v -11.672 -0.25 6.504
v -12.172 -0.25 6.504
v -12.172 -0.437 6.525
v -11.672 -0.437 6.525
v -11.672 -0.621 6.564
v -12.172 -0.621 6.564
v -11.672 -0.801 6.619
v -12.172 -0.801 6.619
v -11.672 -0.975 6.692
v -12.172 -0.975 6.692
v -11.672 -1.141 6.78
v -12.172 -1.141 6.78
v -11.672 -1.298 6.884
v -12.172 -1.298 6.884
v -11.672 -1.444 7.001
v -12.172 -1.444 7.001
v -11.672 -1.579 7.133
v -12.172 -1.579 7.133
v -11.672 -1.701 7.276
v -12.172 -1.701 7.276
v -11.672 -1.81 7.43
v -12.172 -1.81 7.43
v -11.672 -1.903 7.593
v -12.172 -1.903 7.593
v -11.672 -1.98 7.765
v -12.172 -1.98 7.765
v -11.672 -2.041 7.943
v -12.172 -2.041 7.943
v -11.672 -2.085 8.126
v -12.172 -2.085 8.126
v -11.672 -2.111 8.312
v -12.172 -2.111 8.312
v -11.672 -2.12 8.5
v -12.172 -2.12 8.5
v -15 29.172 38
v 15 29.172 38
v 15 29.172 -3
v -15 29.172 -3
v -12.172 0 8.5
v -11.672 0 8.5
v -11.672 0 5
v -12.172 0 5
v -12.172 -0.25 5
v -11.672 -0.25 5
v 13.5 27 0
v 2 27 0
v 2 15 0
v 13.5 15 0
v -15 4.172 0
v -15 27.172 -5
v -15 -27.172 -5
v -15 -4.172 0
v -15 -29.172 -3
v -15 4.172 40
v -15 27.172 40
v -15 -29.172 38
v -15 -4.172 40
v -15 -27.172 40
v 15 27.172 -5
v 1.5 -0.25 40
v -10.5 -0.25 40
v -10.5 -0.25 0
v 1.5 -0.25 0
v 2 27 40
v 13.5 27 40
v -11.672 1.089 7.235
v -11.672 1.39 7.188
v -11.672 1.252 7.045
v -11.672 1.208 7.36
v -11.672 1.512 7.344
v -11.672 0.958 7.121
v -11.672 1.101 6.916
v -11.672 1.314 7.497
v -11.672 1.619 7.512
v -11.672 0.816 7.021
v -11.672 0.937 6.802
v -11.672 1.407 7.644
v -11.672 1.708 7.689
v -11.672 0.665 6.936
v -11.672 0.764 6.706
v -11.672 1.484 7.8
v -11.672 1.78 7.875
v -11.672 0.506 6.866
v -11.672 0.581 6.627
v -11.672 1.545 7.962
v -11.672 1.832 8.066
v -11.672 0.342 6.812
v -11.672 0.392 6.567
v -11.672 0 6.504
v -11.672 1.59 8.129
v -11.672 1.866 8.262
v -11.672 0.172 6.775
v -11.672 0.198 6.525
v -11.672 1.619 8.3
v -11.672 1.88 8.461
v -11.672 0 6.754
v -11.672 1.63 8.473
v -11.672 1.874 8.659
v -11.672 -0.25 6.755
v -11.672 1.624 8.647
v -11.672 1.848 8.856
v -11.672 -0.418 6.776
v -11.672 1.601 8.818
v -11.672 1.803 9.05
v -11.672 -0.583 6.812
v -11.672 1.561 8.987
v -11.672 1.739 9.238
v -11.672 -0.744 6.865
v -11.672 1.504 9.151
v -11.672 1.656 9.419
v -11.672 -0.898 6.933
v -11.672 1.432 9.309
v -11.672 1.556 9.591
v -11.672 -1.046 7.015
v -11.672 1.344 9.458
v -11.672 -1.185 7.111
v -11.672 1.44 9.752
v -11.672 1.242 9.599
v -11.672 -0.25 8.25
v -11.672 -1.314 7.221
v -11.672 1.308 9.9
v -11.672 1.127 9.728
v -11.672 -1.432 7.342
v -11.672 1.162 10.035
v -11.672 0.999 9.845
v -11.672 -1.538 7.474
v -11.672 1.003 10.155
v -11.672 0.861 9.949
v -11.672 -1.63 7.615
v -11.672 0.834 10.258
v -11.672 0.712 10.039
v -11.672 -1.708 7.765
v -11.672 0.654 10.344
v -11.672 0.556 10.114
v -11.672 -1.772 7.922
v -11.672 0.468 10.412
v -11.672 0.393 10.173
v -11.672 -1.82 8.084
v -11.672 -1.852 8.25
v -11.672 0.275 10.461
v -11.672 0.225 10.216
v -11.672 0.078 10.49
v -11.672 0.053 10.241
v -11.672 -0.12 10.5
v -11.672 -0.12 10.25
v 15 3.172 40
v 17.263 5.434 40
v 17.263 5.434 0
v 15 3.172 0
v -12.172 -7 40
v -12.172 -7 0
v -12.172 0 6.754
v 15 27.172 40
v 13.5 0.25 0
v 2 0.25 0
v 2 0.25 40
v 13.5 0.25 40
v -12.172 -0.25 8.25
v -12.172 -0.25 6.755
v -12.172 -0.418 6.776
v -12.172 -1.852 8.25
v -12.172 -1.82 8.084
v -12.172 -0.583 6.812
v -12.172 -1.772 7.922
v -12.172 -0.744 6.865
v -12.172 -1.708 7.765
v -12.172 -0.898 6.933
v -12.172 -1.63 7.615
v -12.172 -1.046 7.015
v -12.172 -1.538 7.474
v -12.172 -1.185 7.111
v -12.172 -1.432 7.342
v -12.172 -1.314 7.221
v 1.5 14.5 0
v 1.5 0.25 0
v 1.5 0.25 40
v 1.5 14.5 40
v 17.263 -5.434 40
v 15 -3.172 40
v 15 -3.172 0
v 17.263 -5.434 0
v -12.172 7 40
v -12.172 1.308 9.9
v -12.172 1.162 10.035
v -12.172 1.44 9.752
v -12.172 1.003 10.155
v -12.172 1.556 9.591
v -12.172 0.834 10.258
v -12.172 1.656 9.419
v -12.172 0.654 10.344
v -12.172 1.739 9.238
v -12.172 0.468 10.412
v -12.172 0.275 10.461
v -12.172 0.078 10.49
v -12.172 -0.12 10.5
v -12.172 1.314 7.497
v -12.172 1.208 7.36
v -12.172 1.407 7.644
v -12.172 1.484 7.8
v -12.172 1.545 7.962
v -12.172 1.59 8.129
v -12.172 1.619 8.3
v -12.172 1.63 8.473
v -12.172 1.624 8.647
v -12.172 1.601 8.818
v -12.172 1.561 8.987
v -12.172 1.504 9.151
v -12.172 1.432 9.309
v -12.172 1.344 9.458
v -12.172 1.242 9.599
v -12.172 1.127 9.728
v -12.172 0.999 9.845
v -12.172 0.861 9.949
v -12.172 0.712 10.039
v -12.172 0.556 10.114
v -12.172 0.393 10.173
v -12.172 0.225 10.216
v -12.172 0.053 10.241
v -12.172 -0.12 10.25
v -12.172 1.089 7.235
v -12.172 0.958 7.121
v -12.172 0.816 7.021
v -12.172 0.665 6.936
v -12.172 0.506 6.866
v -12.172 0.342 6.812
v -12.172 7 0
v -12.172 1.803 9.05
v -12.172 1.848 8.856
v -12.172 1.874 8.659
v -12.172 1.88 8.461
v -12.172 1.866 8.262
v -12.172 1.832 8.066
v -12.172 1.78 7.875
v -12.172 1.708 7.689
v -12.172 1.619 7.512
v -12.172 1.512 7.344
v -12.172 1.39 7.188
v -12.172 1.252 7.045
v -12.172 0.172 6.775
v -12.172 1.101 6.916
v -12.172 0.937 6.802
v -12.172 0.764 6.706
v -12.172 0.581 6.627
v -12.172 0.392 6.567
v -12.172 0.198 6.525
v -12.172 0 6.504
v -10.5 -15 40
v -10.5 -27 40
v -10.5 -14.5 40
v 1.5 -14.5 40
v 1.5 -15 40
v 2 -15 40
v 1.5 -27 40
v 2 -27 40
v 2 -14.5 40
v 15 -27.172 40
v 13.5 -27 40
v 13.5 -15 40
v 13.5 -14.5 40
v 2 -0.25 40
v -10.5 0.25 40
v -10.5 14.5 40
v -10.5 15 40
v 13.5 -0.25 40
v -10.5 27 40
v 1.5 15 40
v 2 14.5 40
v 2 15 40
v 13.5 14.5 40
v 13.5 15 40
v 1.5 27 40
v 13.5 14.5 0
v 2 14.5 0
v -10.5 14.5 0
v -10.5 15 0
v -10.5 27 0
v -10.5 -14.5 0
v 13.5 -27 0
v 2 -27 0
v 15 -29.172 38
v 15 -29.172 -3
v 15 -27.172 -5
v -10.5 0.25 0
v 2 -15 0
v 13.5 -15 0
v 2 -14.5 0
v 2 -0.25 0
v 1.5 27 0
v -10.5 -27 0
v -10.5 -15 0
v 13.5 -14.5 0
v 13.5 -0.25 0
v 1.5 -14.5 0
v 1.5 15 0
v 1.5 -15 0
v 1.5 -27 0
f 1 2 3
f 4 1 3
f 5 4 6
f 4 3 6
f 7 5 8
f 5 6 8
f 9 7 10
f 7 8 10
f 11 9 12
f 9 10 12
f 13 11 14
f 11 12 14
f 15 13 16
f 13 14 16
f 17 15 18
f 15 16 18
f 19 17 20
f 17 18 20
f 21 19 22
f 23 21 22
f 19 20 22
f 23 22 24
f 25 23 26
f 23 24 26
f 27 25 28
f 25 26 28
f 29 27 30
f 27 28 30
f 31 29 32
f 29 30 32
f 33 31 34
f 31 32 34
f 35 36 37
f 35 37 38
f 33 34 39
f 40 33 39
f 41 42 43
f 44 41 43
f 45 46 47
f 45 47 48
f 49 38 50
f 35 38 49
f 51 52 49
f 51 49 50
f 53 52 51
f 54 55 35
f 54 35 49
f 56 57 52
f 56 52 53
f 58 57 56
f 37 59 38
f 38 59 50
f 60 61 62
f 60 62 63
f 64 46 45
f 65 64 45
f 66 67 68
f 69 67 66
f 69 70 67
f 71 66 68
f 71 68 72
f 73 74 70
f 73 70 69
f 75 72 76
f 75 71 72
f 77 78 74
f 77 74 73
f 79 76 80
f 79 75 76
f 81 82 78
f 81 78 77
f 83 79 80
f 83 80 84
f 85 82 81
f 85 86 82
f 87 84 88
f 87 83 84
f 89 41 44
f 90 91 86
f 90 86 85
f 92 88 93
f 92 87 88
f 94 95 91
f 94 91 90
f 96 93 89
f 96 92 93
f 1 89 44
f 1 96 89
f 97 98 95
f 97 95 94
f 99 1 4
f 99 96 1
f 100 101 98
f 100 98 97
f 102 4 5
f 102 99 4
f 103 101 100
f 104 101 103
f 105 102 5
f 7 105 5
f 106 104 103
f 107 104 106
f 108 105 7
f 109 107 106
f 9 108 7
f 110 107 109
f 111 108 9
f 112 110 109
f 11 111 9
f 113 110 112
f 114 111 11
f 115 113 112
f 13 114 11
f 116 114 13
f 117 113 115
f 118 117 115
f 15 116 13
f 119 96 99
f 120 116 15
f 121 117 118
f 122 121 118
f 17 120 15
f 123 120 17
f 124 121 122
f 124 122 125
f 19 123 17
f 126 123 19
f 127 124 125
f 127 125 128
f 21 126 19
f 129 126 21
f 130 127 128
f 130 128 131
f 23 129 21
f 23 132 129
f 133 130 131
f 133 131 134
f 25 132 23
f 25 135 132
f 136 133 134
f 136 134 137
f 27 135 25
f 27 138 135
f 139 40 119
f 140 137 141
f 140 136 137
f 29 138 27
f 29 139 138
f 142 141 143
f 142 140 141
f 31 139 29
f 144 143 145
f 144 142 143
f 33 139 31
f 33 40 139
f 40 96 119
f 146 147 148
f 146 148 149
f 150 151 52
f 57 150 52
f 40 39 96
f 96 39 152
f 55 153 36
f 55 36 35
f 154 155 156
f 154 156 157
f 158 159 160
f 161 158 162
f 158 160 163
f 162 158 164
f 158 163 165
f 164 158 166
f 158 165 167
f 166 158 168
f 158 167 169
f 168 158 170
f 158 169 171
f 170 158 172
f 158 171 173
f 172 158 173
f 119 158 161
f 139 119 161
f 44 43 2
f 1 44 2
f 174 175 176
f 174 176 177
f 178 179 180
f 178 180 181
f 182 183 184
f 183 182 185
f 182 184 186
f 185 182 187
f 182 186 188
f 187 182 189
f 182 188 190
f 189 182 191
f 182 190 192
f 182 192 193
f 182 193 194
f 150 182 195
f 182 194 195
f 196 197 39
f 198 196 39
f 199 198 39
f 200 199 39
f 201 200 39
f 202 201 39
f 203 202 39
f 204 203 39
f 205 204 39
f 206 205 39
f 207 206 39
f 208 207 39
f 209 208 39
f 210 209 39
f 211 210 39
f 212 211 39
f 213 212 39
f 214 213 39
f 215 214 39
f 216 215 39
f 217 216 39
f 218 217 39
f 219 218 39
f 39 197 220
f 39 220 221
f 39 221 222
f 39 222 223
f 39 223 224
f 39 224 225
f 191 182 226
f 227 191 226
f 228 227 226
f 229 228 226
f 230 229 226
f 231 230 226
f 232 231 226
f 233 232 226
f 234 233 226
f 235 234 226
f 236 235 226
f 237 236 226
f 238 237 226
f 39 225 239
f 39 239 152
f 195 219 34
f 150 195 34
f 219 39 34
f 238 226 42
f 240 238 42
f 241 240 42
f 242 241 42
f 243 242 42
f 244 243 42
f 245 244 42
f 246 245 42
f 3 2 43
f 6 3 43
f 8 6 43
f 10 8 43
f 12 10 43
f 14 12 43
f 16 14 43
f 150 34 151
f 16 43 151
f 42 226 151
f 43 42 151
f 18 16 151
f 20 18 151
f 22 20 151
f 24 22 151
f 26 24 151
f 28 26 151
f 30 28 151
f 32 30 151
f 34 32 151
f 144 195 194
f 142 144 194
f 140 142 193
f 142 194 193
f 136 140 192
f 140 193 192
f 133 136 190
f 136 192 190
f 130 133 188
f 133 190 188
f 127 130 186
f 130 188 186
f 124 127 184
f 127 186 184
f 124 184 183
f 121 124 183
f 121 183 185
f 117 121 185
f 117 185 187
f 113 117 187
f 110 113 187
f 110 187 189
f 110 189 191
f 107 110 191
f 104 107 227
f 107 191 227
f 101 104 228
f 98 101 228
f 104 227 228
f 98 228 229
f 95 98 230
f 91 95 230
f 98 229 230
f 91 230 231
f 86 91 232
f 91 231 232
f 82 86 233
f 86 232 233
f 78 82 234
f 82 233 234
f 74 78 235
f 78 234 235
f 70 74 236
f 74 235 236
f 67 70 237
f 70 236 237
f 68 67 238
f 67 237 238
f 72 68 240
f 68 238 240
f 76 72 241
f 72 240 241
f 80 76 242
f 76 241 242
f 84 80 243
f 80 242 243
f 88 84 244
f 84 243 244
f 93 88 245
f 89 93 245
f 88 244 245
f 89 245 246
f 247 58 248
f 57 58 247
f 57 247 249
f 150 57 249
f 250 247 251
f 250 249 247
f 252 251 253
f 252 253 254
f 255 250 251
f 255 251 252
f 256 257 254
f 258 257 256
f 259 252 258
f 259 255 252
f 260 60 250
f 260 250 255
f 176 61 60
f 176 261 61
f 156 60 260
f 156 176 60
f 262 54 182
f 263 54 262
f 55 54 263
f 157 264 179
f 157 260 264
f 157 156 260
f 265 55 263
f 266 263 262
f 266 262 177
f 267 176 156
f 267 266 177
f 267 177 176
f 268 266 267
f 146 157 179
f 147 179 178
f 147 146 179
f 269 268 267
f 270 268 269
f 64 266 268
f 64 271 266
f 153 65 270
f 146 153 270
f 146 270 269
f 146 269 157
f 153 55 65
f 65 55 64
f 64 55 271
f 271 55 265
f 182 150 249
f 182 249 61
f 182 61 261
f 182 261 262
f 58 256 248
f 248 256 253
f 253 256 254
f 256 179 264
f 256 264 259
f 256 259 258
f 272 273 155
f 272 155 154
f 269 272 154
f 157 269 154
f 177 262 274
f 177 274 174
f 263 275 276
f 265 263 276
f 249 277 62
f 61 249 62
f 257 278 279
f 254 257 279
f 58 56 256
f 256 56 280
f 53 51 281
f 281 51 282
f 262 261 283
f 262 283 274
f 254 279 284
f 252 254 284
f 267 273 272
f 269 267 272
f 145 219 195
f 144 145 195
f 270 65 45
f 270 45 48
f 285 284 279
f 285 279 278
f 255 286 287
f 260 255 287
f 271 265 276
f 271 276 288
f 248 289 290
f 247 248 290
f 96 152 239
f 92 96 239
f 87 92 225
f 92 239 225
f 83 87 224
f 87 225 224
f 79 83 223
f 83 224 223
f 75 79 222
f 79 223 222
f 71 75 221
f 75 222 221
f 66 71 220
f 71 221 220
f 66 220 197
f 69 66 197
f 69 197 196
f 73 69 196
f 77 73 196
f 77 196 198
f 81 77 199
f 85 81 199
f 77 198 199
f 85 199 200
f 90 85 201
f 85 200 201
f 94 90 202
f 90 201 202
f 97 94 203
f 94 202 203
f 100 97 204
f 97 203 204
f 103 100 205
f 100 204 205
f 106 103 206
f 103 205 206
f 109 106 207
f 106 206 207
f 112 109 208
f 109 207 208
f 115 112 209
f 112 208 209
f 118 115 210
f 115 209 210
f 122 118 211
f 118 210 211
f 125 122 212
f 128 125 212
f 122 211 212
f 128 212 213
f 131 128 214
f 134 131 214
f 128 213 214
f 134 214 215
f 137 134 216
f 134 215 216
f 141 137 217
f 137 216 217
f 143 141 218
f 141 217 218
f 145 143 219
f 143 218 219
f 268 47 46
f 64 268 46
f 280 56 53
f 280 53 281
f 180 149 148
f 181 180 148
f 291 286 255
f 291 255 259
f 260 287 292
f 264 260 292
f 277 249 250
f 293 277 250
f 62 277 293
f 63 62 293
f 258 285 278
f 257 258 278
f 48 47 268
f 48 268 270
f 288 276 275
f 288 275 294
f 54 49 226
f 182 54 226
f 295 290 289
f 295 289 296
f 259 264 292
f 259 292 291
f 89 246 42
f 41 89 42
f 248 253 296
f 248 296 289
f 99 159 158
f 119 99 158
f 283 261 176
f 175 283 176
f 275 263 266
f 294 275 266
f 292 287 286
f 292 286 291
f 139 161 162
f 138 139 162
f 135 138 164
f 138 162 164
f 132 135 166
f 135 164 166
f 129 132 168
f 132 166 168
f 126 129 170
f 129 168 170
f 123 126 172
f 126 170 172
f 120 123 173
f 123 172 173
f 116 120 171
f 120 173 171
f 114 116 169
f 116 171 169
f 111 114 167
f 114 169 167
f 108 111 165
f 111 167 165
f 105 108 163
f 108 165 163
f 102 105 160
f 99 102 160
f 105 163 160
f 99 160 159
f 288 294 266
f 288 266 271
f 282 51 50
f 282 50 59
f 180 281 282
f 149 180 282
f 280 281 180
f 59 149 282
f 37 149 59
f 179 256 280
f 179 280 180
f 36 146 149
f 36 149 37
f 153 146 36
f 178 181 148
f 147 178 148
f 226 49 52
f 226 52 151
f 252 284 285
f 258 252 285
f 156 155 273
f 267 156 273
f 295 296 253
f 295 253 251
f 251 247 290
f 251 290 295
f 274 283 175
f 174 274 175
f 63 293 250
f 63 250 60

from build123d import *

# Parameters (mm, degrees)
F0_W     = 0.5
F0_H     = 14.25
F0_H_2   = 12
F0_W_2   = 11.5
F0_H_3   = 0.5
F0_W_3   = 12
F1_DEPTH = 40
F2_DEPTH = 5
F3_SIZE  = 2
F5_DEPTH = 0.5


with BuildPart() as f1:
    # F0 (on Top) → F1 (new body)
    with BuildSketch(Plane.XY):
        Polygon((17.2627416998, 5.4343145751), (15, 3.1715728753), (15, -3.1715728753), (17.2627416998, -5.4343145751), (17.2627416998, -0.5656854249), (17.2627416998, 0.5656854249), align=None)
        Polygon((-15, 29.1715728753), (-15, 4.1715728753), (-12.1715728752, 7), (-12.1715728752, 0), (-12.1715728752, -7), (-15, -4.1715728753), (-15, -29.1715728753), (15, -29.1715728753), (15, -3.1715728753), (15, 3.1715728753), (15, 29.1715728753), align=None)
        Polygon((-10.4999961331, 14.999999851), (-10.4999961331, 26.999999851), (1.5000038669, 26.999999851), (2.0000038669, 26.999999851), (13.5000038669, 26.999999851), (13.5000038669, 14.999999851), (13.5000038669, 14.499999851), (13.5000038669, 0.249999851), (13.5000038669, -0.250000149), (13.5000038669, -14.500000149), (13.5000038669, -15.000000149), (13.5000038669, -27.000000149), (2.0000038669, -27.000000149), (1.5000038669, -27.000000149), (-10.4999961331, -27.000000149), (-10.4999961331, -15.000000149), (-10.4999961331, -14.500000149), (-10.4999961331, -0.250000149), (-10.4999961331, 0.249999851), (-10.4999961331, 14.499999851), align=None, mode=Mode.SUBTRACT)
        with Locations((1.7500038669, -7.375000149)):
            Rectangle(F0_W, F0_H)
        with Locations((1.7500038669, 20.999999851)):
            Rectangle(F0_W, F0_H_2)
        with Locations((7.7500038669, 14.749999851)):
            Rectangle(F0_W_2, F0_H_3)
        with Locations((-4.4999961331, -1.49e-07)):
            Rectangle(F0_W_3, F0_H_3)
        with Locations((7.7500038669, -1.49e-07)):
            Rectangle(F0_W_2, F0_H_3)
        with Locations((7.7500038669, -14.750000149)):
            Rectangle(F0_W_2, F0_H_3)
        with Locations((-4.4999961331, -14.750000149)):
            Rectangle(F0_W_3, F0_H_3)
        with Locations((-4.4999961331, 14.749999851)):
            Rectangle(F0_W_3, F0_H_3)
        with Locations((1.7500038669, 7.374999851)):
            Rectangle(F0_W, F0_H)
        with Locations((1.7500038669, -21.000000149)):
            Rectangle(F0_W, F0_H_2)
        with Locations((1.7500038669, -14.750000149)):
            Rectangle(F0_W, F0_H_3)
        with Locations((1.7500038669, -1.49e-07)):
            Rectangle(F0_W, F0_H_3)
        with Locations((1.7500038669, 14.749999851)):
            Rectangle(F0_W, F0_H_3)
    extrude(amount=F1_DEPTH)

    # F0 (on Top) → F2 (join)
    with BuildSketch(Plane.XY):
        Polygon((-15, 29.1715728753), (-15, 4.1715728753), (-12.1715728752, 7), (-12.1715728752, 0), (-12.1715728752, -7), (-15, -4.1715728753), (-15, -29.1715728753), (15, -29.1715728753), (15, -3.1715728753), (15, 3.1715728753), (15, 29.1715728753), align=None)
        Polygon((-10.4999961331, 14.999999851), (-10.4999961331, 26.999999851), (1.5000038669, 26.999999851), (2.0000038669, 26.999999851), (13.5000038669, 26.999999851), (13.5000038669, 14.999999851), (13.5000038669, 14.499999851), (13.5000038669, 0.249999851), (13.5000038669, -0.250000149), (13.5000038669, -14.500000149), (13.5000038669, -15.000000149), (13.5000038669, -27.000000149), (2.0000038669, -27.000000149), (1.5000038669, -27.000000149), (-10.4999961331, -27.000000149), (-10.4999961331, -15.000000149), (-10.4999961331, -14.500000149), (-10.4999961331, -0.250000149), (-10.4999961331, 0.249999851), (-10.4999961331, 14.499999851), align=None, mode=Mode.SUBTRACT)
        Polygon((-12.1715728752, 7), (-15, 4.1715728753), (-15, -4.1715728753), (-12.1715728752, -7), (-12.1715728752, 0), align=None)
        with Locations((1.7500038669, -21.000000149)):
            Rectangle(F0_W, F0_H_2)
        with Locations((7.7500038669, -21.000000149)):
            Rectangle(F0_W_2, F0_H_2)
        with Locations((-4.4999961331, -21.000000149)):
            Rectangle(F0_W_3, F0_H_2)
        with Locations((-4.4999961331, -14.750000149)):
            Rectangle(F0_W_3, F0_H_3)
        with Locations((1.7500038669, -14.750000149)):
            Rectangle(F0_W, F0_H_3)
        with Locations((1.7500038669, -7.375000149)):
            Rectangle(F0_W, F0_H)
        with Locations((-4.4999961331, -7.375000149)):
            Rectangle(F0_W_3, F0_H)
        with Locations((7.7500038669, -7.375000149)):
            Rectangle(F0_W_2, F0_H)
        with Locations((7.7500038669, 7.374999851)):
            Rectangle(F0_W_2, F0_H)
        with Locations((-4.4999961331, 7.374999851)):
            Rectangle(F0_W_3, F0_H)
        with Locations((1.7500038669, -1.49e-07)):
            Rectangle(F0_W, F0_H_3)
        with Locations((1.7500038669, 7.374999851)):
            Rectangle(F0_W, F0_H)
        with Locations((7.7500038669, 14.749999851)):
            Rectangle(F0_W_2, F0_H_3)
        with Locations((1.7500038669, 14.749999851)):
            Rectangle(F0_W, F0_H_3)
        with Locations((-4.4999961331, 14.749999851)):
            Rectangle(F0_W_3, F0_H_3)
        with Locations((-4.4999961331, 20.999999851)):
            Rectangle(F0_W_3, F0_H_2)
        with Locations((7.7500038669, 20.999999851)):
            Rectangle(F0_W_2, F0_H_2)
        with Locations((1.7500038669, 20.999999851)):
            Rectangle(F0_W, F0_H_2)
        with Locations((-4.4999961331, -1.49e-07)):
            Rectangle(F0_W_3, F0_H_3)
        with Locations((7.7500038669, -1.49e-07)):
            Rectangle(F0_W_2, F0_H_3)
        with Locations((7.7500038669, -14.750000149)):
            Rectangle(F0_W_2, F0_H_3)
    extrude(amount=-F2_DEPTH)

    # F3
    f3_edges = [f1.edges().sort_by_distance(p)[0] for p in [
        (0, -29.171573, -5),
        (0, 29.171573, -5),
        (0, -29.171573, 40),
        (0, 29.171573, 40),
    ]]
    chamfer(f3_edges, length=F3_SIZE)

    # F4 (on face) → F5 (cut)
    with BuildSketch(Plane(origin=(-12.1715728752, 0, 0), x_dir=(0, -1, 0), z_dir=(-1, 0, 0))):
        with BuildLine():
            Line((0.12, 10.25), (0.12, 10.5))
            ThreePointArc((0.12, 10.5), (-1.8790989856, 8.5600270426), (0, 6.5036032458))
            Line((0, 6.5036032458), (0, 6.7541191335))
            ThreePointArc((0, 6.7541191335), (-1.6289699135, 8.5600353381), (0.12, 10.25))
        make_face()
        with BuildLine():
            Line((0, 8.5), (0, 6.7541191335))
            ThreePointArc((0, 6.7541191335), (0.1250128042, 6.7500071795), (0.25, 6.7548352513))
            Line((0.25, 6.7548352513), (0.25, 8.25))
            Line((0.25, 8.25), (1.8520508076, 8.25))
            ThreePointArc((1.8520508076, 8.25), (1.865506934, 8.3746782406), (1.87, 8.5))
            Line((1.87, 8.5), (0, 8.5))
        make_face()
        with BuildLine():
            Line((0.25, 6.7548352513), (0.25, 6.5042294721))
            ThreePointArc((0.25, 6.5042294721), (1.5794519519, 7.1325205669), (2.12, 8.5))
            Line((2.12, 8.5), (1.87, 8.5))
            ThreePointArc((1.87, 8.5), (1.865506934, 8.3746782406), (1.8520508076, 8.25))
            ThreePointArc((1.8520508076, 8.25), (1.3140216535, 7.2206203491), (0.25, 6.7548352513))
        make_face()
        with BuildLine():
            Line((0, 6.7541191335), (0, 6.5036032458))
            ThreePointArc((0, 6.5036032458), (0.1250097944, 6.5000062745), (0.25, 6.5042294721))
            Line((0.25, 6.5042294721), (0.25, 6.7548352513))
            ThreePointArc((0.25, 6.7548352513), (0.1250128042, 6.7500071795), (0, 6.7541191335))
        make_face()
        with BuildLine():
            ThreePointArc((0.25, 6.5042294721), (0.1250097944, 6.5000062745), (0, 6.5036032458))
            Line((0, 6.5036032458), (0, 5))
            Line((0, 5), (0.25, 5))
            Line((0.25, 5), (0.25, 6.5042294721))
        make_face()
    extrude(amount=-F5_DEPTH, mode=Mode.SUBTRACT)


solid = f1.part
